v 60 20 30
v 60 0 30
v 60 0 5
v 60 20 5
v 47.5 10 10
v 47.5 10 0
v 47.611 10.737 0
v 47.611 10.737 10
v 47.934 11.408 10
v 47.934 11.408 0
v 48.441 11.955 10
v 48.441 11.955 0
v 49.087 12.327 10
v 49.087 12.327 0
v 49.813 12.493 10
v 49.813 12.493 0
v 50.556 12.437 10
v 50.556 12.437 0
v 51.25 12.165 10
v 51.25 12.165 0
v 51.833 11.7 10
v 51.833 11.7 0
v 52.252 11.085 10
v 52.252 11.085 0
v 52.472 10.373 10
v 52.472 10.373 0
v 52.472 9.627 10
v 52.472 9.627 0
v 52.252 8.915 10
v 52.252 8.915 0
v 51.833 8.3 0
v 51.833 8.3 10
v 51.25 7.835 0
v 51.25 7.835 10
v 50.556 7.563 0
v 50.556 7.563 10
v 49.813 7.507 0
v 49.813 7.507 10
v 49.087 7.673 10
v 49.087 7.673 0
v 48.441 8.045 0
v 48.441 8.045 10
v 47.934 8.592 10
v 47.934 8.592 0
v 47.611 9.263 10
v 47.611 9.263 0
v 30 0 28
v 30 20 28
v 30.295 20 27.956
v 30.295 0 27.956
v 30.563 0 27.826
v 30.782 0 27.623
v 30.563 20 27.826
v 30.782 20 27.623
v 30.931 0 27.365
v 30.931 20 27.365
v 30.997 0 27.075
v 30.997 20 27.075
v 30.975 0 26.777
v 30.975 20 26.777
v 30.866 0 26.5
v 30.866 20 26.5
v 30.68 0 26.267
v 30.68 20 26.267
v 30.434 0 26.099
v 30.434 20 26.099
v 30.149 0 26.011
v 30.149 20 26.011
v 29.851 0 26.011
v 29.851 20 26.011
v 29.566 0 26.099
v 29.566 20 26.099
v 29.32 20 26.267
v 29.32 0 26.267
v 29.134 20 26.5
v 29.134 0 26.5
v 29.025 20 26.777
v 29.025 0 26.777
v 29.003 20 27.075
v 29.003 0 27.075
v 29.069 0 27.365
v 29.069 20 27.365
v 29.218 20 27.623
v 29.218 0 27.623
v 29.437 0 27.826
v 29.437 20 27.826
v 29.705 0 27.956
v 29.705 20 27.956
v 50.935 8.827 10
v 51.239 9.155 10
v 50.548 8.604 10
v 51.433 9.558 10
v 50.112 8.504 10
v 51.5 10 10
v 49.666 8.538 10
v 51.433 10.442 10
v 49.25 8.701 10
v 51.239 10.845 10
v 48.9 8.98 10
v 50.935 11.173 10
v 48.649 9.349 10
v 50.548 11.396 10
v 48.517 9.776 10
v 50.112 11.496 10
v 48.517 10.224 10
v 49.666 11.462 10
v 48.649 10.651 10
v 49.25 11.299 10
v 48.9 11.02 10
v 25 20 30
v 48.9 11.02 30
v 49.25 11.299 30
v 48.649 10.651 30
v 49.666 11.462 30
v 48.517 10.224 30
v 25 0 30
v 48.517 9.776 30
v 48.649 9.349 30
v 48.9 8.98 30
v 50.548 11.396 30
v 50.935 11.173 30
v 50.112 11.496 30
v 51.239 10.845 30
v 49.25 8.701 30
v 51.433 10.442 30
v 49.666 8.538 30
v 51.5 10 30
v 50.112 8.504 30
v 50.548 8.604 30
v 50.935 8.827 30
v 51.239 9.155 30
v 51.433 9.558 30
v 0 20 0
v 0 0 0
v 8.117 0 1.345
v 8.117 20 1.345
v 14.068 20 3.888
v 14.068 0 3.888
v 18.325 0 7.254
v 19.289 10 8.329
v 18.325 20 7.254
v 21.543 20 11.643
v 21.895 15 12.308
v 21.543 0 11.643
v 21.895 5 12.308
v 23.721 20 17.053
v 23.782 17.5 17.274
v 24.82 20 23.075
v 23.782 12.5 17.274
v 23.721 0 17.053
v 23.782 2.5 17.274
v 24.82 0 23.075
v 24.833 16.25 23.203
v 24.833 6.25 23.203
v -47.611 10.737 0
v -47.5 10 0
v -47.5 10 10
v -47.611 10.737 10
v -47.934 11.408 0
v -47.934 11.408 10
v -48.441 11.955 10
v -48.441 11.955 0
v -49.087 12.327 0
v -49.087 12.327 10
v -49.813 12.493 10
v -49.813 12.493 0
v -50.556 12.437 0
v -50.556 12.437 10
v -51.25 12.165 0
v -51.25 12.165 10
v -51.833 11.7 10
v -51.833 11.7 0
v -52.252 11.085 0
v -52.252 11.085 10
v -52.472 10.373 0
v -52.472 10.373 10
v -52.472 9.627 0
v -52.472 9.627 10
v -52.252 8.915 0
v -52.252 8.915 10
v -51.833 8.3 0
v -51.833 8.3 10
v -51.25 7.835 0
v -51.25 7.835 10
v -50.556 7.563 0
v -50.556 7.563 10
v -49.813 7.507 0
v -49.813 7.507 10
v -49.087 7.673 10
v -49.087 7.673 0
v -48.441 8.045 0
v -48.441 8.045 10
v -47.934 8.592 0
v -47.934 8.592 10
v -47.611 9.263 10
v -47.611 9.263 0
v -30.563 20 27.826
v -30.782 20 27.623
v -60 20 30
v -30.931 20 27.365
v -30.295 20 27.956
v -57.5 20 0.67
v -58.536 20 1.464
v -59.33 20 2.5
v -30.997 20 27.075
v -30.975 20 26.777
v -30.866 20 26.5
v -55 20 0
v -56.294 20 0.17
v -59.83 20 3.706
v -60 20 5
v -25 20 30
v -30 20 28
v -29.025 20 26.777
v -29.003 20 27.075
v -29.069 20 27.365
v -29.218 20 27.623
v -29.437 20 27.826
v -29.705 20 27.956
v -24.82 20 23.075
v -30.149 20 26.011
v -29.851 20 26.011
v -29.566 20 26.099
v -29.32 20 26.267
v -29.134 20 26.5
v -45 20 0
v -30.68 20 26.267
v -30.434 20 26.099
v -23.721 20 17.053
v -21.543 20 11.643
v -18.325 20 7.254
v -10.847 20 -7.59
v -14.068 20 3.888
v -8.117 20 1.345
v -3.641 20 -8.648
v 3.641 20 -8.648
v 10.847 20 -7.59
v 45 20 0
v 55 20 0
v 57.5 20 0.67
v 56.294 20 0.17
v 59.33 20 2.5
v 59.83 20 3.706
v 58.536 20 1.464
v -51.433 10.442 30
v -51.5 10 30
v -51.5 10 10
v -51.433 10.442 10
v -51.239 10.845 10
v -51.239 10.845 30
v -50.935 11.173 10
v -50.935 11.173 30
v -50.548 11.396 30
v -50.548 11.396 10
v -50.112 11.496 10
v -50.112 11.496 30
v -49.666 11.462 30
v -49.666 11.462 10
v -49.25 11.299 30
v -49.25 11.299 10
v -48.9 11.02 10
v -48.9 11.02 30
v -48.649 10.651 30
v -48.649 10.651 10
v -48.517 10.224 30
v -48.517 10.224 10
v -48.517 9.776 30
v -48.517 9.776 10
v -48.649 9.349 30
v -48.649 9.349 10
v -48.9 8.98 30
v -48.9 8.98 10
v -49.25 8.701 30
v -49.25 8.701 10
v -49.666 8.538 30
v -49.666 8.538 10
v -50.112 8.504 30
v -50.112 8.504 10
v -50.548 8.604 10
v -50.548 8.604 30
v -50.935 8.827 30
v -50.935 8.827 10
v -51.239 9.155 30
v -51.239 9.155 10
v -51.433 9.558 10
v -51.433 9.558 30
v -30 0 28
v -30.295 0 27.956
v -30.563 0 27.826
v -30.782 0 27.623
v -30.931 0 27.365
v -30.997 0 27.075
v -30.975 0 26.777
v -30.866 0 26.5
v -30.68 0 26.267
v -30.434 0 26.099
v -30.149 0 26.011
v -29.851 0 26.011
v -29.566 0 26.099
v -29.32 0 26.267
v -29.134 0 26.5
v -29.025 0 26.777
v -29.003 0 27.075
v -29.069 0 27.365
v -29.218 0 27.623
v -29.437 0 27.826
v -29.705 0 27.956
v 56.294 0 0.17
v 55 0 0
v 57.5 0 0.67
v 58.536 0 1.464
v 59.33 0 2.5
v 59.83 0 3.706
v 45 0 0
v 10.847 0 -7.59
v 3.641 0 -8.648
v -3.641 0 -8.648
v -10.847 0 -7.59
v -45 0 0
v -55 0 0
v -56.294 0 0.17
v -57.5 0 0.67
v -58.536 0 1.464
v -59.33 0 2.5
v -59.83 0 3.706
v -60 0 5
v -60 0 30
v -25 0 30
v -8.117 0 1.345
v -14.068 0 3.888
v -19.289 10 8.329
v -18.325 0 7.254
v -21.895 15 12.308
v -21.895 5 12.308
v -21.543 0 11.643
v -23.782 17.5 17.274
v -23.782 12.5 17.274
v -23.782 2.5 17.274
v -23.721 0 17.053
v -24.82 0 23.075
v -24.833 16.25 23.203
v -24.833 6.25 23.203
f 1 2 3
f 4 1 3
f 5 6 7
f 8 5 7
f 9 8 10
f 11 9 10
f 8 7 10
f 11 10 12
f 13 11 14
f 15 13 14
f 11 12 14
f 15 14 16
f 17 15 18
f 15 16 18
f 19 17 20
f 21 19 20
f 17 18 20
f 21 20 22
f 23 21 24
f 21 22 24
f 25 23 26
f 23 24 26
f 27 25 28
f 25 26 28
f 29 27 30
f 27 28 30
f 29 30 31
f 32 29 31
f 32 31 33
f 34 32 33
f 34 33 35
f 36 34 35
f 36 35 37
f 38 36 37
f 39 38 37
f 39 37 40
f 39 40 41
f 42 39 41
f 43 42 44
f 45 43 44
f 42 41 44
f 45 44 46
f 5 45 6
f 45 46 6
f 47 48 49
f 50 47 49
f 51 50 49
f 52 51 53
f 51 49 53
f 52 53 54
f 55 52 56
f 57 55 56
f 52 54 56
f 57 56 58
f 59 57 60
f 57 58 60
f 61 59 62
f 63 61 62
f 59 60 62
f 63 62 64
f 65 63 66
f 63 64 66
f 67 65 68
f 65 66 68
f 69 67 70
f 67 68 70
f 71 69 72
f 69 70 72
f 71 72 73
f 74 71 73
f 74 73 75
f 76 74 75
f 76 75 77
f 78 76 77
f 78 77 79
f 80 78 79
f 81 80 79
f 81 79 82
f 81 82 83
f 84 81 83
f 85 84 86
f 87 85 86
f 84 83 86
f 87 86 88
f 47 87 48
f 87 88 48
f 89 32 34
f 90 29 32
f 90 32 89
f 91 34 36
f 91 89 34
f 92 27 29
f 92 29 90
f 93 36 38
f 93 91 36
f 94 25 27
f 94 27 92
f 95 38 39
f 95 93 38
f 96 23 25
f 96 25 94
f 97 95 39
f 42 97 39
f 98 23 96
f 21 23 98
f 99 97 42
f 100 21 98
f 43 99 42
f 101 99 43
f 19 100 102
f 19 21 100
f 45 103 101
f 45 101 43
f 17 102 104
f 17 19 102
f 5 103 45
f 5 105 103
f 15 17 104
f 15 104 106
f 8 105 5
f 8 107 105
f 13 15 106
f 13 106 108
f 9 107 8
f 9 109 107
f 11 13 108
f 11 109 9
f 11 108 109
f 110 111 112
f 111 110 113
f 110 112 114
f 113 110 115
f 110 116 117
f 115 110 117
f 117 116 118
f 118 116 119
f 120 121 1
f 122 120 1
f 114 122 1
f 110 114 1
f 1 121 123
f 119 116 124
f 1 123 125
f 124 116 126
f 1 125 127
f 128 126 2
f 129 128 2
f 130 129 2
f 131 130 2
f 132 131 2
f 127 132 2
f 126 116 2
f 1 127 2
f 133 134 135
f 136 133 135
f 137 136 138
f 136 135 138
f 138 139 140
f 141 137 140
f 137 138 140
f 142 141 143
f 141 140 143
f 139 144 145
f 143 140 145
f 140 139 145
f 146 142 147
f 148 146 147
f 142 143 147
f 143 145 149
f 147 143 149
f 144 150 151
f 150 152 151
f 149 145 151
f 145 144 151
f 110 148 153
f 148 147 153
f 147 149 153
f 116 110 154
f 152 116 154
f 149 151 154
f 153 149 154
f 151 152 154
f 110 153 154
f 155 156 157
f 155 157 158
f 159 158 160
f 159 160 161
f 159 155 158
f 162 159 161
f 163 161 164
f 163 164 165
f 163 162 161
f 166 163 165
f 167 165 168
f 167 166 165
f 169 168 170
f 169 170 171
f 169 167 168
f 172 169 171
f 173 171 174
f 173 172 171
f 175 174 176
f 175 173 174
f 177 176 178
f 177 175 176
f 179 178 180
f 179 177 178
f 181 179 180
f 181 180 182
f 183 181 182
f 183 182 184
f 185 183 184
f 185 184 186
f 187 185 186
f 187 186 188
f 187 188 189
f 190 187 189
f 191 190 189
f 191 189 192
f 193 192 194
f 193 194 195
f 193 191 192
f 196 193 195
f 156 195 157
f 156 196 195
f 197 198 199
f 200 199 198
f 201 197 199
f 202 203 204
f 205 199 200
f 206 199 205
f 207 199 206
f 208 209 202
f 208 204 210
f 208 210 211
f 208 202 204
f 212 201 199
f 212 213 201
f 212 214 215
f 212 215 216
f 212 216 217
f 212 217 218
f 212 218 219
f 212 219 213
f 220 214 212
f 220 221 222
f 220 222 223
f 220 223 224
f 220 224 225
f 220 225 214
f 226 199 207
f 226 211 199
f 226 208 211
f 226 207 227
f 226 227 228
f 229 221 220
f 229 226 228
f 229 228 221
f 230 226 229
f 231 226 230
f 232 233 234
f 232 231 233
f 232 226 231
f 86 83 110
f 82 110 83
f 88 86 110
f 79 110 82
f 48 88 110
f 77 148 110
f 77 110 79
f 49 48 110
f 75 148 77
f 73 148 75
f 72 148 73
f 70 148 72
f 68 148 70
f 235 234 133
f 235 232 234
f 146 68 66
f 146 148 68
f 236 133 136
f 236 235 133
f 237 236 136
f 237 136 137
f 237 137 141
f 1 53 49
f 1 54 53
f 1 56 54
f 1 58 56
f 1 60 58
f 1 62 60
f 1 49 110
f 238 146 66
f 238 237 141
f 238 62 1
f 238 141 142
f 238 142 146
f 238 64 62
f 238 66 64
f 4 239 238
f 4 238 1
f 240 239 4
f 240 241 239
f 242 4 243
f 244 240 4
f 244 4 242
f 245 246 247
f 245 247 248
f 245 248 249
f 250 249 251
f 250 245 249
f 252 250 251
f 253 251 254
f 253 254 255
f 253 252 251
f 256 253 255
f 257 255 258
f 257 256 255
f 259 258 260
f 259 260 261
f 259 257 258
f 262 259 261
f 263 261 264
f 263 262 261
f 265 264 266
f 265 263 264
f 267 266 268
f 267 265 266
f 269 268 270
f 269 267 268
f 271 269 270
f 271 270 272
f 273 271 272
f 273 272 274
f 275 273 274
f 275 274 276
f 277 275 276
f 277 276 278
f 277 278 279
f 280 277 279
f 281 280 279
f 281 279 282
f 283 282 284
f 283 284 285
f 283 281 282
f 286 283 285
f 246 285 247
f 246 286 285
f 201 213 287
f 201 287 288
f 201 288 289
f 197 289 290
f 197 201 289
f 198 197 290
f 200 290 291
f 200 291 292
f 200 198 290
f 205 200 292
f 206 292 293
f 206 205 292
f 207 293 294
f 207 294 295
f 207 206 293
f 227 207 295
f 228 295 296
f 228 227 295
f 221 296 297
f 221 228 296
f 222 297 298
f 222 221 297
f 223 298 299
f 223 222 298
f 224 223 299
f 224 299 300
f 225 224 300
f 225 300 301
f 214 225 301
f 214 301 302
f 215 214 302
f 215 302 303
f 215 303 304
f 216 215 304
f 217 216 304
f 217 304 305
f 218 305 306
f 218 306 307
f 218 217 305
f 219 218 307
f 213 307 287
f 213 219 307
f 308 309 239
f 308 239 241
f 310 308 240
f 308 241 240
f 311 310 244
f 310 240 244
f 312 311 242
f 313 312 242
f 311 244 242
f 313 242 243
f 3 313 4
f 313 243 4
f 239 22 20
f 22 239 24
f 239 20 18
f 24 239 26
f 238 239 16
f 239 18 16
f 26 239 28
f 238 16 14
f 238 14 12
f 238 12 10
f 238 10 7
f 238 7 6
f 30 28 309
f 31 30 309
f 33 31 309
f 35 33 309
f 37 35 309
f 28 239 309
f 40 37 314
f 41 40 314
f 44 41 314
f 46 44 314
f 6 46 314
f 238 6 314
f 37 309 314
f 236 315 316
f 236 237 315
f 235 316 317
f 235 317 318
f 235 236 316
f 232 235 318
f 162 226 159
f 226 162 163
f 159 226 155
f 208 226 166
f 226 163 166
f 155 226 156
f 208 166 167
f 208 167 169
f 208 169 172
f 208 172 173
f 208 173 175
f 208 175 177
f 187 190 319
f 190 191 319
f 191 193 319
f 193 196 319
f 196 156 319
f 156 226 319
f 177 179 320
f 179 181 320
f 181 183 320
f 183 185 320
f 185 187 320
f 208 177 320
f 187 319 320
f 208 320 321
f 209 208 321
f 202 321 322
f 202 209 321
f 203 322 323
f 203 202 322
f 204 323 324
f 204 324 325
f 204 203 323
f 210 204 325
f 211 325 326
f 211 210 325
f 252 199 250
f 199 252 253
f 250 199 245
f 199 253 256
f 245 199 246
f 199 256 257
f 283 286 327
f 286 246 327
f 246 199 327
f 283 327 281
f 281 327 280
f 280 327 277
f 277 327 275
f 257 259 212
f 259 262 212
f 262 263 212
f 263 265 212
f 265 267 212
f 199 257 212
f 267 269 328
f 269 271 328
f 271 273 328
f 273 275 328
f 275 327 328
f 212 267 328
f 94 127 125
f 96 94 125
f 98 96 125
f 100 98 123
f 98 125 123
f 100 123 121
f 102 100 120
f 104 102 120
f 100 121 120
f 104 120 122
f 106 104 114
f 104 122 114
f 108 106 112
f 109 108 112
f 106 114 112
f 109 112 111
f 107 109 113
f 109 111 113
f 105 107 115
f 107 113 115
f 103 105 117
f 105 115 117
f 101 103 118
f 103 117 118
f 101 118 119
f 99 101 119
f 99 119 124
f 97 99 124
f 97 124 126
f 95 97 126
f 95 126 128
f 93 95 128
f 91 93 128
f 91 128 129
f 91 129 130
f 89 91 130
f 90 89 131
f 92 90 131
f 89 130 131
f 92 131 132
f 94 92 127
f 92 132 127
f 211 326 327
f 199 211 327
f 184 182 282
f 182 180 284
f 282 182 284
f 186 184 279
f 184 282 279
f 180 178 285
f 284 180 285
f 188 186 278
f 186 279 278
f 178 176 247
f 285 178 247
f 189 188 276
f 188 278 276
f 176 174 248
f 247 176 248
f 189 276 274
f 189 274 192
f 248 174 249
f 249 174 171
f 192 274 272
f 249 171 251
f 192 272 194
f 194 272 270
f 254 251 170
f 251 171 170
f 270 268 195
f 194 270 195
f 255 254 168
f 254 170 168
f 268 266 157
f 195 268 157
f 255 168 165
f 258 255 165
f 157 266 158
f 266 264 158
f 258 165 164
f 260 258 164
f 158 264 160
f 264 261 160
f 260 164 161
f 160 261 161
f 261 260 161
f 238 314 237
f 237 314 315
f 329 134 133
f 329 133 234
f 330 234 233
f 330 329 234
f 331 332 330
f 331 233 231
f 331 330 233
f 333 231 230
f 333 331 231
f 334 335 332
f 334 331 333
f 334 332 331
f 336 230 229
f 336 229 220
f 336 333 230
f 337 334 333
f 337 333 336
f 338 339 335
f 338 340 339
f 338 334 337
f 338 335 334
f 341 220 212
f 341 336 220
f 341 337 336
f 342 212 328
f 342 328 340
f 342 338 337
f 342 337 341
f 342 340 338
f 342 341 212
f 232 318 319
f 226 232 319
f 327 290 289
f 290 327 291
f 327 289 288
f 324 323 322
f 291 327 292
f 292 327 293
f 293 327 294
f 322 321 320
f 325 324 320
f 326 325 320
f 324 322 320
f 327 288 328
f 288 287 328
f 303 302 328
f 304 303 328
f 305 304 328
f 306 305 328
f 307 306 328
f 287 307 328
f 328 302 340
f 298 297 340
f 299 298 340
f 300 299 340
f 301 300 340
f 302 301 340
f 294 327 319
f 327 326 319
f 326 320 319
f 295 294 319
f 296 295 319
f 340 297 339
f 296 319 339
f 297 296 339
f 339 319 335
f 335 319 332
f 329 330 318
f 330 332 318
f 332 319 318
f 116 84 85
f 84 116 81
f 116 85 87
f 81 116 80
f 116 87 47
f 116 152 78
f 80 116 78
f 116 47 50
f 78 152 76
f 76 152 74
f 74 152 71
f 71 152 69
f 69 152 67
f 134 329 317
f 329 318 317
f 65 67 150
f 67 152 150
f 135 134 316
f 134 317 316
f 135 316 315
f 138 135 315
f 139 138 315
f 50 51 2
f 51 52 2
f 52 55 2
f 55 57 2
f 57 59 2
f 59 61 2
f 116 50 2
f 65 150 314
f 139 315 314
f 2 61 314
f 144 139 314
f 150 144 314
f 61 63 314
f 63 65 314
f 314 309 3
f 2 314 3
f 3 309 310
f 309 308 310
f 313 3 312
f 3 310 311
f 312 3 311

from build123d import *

# Parameters (mm, degrees)
BOSS_EXTRUDE1_DEPTH = 20
FILLET1_R           = 50
FILLET2_R           = 5
SKETCH3_R           = 1.5
CUT_EXTRUDE1_DEPTH  = 20
SKETCH4_R           = 2.5
CUT_EXTRUDE2_DEPTH  = 10
SKETCH5_R           = 1
CUT_EXTRUDE3_DEPTH  = 20


with BuildPart() as part:
    # Sketch2 → Boss-Extrude1 (new body)
    with BuildSketch(Plane(origin=(0, 0, 0), x_dir=(1, 0, 0), z_dir=(0, 1, 0))):
        with BuildLine():
            Line((25, -30), (60, -30))
            Line((60, -30), (60, 0))
            Line((60, 0), (45, 0))
            Line((45, 0), (0, 10))
            Line((0, 10), (-45, 0))
            Line((-45, 0), (-60, 0))
            Line((-60, 0), (-60, -30))
            Line((-60, -30), (-25, -30))
            add(Edge.make_bspline(
                [(0, 0), (-26.0775505, -1.658562804), (-25, -30)],
                knots=[0, 0, 0, 1, 1, 1], degree=2))
            add(Edge.make_bspline(
                [(0, 0), (26.0775505, -1.658562804), (25, -30)],
                knots=[0, 0, 0, 1, 1, 1], degree=2))
        make_face()
    extrude(amount=BOSS_EXTRUDE1_DEPTH)

    # Fillet1
    fillet1_edges = [part.edges().sort_by_distance(p)[0] for p in [
        (0, 10, -10),
    ]]
    fillet(fillet1_edges, radius=FILLET1_R)

    # Fillet2
    fillet2_edges = [part.edges().sort_by_distance(p)[0] for p in [
        (-60, 10, 0),
        (60, 10, 0),
    ]]
    fillet(fillet2_edges, radius=FILLET2_R)

    # Sketch3 → Cut-Extrude1 (cut)
    with BuildSketch(Plane.XY.offset(30)):
        with Locations((50, 10)):
            Circle(SKETCH3_R)
    cut_extrude1 = extrude(amount=-CUT_EXTRUDE1_DEPTH, mode=Mode.SUBTRACT)

    # Sketch4 → Cut-Extrude2 (cut)
    with BuildSketch(Plane(origin=(0, 0, 0), x_dir=(-1, 0, 0), z_dir=(0, 0, -1))):
        with Locations((-50, 10)):
            Circle(SKETCH4_R)
    cut_extrude2 = extrude(amount=-CUT_EXTRUDE2_DEPTH, mode=Mode.SUBTRACT)

    # Mirror1: Cut-Extrude1, Cut-Extrude2 across plane
    add(cut_extrude1.mirror(Plane(origin=(0, 0, 0), x_dir=(0, 0, 1), z_dir=(1, 0, 0))), mode=Mode.SUBTRACT)
    add(cut_extrude2.mirror(Plane(origin=(0, 0, 0), x_dir=(0, 0, 1), z_dir=(1, 0, 0))), mode=Mode.SUBTRACT)

    # Sketch5 → Cut-Extrude3 (cut)
    with BuildSketch(Plane(origin=(0, 20, 0), x_dir=(1, 0, 0), z_dir=(0, 1, 0))):
        with Locations(Location((30, -27, 0), (0, 0, 270))):
            Circle(SKETCH5_R)
    cut_extrude3 = extrude(amount=-CUT_EXTRUDE3_DEPTH, mode=Mode.SUBTRACT)

    # Mirror2: Cut-Extrude3 across plane
    add(cut_extrude3.mirror(Plane(origin=(0, 0, 0), x_dir=(0, 0, 1), z_dir=(1, 0, 0))), mode=Mode.SUBTRACT)


solid = part.part
